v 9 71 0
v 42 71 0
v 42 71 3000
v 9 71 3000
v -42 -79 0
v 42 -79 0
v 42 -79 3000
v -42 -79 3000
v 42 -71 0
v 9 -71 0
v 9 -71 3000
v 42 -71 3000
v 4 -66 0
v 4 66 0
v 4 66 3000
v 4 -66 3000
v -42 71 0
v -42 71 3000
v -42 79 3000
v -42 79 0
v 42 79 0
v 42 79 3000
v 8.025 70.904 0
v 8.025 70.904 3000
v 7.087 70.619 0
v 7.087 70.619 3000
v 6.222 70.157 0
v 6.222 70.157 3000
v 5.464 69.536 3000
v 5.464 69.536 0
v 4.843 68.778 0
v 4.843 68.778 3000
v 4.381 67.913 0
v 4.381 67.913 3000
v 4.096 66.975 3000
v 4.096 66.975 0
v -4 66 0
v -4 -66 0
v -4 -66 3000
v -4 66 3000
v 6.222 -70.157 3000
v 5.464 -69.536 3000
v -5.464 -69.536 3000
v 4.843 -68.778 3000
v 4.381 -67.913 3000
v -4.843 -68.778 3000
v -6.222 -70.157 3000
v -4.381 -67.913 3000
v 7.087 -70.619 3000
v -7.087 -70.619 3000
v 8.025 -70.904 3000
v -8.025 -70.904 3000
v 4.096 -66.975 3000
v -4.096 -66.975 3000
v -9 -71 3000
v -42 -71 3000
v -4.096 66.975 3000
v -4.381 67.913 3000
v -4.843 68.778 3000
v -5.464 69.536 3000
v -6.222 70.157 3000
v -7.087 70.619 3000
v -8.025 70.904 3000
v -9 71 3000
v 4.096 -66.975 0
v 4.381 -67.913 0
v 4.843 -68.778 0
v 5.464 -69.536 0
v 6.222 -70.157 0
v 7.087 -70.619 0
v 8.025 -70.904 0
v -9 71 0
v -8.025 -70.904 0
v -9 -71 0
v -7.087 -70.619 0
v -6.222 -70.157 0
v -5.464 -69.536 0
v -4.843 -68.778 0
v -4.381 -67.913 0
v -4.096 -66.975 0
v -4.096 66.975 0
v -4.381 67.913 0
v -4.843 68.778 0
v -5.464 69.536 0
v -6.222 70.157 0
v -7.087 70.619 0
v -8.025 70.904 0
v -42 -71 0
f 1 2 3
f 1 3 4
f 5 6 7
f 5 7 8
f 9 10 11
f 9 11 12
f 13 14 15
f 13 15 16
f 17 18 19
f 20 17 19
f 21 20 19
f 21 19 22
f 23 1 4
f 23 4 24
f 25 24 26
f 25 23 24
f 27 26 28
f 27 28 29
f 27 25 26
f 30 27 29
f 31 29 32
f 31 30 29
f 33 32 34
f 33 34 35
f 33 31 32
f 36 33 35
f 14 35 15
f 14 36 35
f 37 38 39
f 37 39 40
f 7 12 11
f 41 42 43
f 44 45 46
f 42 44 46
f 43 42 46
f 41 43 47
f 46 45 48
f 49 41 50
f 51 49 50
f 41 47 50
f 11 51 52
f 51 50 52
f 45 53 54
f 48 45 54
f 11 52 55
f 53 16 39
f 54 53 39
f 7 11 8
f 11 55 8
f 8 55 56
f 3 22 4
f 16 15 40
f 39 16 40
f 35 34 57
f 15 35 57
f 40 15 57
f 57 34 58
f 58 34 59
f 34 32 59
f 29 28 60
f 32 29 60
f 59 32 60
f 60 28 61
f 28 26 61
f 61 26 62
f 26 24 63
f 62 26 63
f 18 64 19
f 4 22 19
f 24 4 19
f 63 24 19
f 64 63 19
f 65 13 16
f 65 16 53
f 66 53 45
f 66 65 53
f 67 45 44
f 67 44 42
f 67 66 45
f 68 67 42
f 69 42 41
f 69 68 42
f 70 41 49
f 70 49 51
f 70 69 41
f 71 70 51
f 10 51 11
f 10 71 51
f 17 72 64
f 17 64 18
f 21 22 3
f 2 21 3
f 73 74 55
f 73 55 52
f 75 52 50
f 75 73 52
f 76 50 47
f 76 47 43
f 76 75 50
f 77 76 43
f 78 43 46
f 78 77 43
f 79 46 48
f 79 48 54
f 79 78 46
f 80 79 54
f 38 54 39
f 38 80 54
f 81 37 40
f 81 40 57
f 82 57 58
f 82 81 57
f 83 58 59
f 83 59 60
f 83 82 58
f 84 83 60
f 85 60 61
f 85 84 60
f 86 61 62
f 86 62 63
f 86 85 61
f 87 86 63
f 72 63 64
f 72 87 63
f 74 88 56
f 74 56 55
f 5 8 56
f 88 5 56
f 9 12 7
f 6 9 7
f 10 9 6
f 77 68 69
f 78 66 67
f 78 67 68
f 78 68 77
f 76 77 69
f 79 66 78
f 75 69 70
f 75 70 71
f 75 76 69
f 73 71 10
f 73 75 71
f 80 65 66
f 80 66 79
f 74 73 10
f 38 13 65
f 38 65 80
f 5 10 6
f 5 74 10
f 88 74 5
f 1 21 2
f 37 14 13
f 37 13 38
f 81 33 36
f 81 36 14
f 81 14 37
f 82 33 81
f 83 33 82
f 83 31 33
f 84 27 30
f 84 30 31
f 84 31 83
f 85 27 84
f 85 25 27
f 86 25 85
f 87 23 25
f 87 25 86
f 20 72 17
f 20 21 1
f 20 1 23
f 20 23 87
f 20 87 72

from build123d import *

# Parameters (mm, degrees)
BOSS_EXTRUDE1_DEPTH = 3000


with BuildPart() as part:
    # Sketch1 → Boss-Extrude1 (new body)
    with BuildSketch(Plane.XY):
        with BuildLine():
            Line((-4, -66), (-4, 66))
            ThreePointArc((-4, 66), (-5.464466094, 69.535533906), (-9, 71))
            Line((-9, 71), (-42, 71))
            Line((-42, 71), (-42, 79))
            Line((-42, 79), (42, 79))
            Line((42, 79), (42, 71))
            Line((42, 71), (9, 71))
            ThreePointArc((9, 71), (5.464466094, 69.535533906), (4, 66))
            Line((4, 66), (4, -66))
            ThreePointArc((4, -66), (5.464466094, -69.535533906), (9, -71))
            Line((9, -71), (42, -71))
            Line((42, -71), (42, -79))
            Line((42, -79), (-42, -79))
            Line((-42, -79), (-42, -71))
            Line((-42, -71), (-9, -71))
            ThreePointArc((-9, -71), (-5.464466094, -69.535533906), (-4, -66))
        make_face()
    extrude(amount=BOSS_EXTRUDE1_DEPTH)


solid = part.part
